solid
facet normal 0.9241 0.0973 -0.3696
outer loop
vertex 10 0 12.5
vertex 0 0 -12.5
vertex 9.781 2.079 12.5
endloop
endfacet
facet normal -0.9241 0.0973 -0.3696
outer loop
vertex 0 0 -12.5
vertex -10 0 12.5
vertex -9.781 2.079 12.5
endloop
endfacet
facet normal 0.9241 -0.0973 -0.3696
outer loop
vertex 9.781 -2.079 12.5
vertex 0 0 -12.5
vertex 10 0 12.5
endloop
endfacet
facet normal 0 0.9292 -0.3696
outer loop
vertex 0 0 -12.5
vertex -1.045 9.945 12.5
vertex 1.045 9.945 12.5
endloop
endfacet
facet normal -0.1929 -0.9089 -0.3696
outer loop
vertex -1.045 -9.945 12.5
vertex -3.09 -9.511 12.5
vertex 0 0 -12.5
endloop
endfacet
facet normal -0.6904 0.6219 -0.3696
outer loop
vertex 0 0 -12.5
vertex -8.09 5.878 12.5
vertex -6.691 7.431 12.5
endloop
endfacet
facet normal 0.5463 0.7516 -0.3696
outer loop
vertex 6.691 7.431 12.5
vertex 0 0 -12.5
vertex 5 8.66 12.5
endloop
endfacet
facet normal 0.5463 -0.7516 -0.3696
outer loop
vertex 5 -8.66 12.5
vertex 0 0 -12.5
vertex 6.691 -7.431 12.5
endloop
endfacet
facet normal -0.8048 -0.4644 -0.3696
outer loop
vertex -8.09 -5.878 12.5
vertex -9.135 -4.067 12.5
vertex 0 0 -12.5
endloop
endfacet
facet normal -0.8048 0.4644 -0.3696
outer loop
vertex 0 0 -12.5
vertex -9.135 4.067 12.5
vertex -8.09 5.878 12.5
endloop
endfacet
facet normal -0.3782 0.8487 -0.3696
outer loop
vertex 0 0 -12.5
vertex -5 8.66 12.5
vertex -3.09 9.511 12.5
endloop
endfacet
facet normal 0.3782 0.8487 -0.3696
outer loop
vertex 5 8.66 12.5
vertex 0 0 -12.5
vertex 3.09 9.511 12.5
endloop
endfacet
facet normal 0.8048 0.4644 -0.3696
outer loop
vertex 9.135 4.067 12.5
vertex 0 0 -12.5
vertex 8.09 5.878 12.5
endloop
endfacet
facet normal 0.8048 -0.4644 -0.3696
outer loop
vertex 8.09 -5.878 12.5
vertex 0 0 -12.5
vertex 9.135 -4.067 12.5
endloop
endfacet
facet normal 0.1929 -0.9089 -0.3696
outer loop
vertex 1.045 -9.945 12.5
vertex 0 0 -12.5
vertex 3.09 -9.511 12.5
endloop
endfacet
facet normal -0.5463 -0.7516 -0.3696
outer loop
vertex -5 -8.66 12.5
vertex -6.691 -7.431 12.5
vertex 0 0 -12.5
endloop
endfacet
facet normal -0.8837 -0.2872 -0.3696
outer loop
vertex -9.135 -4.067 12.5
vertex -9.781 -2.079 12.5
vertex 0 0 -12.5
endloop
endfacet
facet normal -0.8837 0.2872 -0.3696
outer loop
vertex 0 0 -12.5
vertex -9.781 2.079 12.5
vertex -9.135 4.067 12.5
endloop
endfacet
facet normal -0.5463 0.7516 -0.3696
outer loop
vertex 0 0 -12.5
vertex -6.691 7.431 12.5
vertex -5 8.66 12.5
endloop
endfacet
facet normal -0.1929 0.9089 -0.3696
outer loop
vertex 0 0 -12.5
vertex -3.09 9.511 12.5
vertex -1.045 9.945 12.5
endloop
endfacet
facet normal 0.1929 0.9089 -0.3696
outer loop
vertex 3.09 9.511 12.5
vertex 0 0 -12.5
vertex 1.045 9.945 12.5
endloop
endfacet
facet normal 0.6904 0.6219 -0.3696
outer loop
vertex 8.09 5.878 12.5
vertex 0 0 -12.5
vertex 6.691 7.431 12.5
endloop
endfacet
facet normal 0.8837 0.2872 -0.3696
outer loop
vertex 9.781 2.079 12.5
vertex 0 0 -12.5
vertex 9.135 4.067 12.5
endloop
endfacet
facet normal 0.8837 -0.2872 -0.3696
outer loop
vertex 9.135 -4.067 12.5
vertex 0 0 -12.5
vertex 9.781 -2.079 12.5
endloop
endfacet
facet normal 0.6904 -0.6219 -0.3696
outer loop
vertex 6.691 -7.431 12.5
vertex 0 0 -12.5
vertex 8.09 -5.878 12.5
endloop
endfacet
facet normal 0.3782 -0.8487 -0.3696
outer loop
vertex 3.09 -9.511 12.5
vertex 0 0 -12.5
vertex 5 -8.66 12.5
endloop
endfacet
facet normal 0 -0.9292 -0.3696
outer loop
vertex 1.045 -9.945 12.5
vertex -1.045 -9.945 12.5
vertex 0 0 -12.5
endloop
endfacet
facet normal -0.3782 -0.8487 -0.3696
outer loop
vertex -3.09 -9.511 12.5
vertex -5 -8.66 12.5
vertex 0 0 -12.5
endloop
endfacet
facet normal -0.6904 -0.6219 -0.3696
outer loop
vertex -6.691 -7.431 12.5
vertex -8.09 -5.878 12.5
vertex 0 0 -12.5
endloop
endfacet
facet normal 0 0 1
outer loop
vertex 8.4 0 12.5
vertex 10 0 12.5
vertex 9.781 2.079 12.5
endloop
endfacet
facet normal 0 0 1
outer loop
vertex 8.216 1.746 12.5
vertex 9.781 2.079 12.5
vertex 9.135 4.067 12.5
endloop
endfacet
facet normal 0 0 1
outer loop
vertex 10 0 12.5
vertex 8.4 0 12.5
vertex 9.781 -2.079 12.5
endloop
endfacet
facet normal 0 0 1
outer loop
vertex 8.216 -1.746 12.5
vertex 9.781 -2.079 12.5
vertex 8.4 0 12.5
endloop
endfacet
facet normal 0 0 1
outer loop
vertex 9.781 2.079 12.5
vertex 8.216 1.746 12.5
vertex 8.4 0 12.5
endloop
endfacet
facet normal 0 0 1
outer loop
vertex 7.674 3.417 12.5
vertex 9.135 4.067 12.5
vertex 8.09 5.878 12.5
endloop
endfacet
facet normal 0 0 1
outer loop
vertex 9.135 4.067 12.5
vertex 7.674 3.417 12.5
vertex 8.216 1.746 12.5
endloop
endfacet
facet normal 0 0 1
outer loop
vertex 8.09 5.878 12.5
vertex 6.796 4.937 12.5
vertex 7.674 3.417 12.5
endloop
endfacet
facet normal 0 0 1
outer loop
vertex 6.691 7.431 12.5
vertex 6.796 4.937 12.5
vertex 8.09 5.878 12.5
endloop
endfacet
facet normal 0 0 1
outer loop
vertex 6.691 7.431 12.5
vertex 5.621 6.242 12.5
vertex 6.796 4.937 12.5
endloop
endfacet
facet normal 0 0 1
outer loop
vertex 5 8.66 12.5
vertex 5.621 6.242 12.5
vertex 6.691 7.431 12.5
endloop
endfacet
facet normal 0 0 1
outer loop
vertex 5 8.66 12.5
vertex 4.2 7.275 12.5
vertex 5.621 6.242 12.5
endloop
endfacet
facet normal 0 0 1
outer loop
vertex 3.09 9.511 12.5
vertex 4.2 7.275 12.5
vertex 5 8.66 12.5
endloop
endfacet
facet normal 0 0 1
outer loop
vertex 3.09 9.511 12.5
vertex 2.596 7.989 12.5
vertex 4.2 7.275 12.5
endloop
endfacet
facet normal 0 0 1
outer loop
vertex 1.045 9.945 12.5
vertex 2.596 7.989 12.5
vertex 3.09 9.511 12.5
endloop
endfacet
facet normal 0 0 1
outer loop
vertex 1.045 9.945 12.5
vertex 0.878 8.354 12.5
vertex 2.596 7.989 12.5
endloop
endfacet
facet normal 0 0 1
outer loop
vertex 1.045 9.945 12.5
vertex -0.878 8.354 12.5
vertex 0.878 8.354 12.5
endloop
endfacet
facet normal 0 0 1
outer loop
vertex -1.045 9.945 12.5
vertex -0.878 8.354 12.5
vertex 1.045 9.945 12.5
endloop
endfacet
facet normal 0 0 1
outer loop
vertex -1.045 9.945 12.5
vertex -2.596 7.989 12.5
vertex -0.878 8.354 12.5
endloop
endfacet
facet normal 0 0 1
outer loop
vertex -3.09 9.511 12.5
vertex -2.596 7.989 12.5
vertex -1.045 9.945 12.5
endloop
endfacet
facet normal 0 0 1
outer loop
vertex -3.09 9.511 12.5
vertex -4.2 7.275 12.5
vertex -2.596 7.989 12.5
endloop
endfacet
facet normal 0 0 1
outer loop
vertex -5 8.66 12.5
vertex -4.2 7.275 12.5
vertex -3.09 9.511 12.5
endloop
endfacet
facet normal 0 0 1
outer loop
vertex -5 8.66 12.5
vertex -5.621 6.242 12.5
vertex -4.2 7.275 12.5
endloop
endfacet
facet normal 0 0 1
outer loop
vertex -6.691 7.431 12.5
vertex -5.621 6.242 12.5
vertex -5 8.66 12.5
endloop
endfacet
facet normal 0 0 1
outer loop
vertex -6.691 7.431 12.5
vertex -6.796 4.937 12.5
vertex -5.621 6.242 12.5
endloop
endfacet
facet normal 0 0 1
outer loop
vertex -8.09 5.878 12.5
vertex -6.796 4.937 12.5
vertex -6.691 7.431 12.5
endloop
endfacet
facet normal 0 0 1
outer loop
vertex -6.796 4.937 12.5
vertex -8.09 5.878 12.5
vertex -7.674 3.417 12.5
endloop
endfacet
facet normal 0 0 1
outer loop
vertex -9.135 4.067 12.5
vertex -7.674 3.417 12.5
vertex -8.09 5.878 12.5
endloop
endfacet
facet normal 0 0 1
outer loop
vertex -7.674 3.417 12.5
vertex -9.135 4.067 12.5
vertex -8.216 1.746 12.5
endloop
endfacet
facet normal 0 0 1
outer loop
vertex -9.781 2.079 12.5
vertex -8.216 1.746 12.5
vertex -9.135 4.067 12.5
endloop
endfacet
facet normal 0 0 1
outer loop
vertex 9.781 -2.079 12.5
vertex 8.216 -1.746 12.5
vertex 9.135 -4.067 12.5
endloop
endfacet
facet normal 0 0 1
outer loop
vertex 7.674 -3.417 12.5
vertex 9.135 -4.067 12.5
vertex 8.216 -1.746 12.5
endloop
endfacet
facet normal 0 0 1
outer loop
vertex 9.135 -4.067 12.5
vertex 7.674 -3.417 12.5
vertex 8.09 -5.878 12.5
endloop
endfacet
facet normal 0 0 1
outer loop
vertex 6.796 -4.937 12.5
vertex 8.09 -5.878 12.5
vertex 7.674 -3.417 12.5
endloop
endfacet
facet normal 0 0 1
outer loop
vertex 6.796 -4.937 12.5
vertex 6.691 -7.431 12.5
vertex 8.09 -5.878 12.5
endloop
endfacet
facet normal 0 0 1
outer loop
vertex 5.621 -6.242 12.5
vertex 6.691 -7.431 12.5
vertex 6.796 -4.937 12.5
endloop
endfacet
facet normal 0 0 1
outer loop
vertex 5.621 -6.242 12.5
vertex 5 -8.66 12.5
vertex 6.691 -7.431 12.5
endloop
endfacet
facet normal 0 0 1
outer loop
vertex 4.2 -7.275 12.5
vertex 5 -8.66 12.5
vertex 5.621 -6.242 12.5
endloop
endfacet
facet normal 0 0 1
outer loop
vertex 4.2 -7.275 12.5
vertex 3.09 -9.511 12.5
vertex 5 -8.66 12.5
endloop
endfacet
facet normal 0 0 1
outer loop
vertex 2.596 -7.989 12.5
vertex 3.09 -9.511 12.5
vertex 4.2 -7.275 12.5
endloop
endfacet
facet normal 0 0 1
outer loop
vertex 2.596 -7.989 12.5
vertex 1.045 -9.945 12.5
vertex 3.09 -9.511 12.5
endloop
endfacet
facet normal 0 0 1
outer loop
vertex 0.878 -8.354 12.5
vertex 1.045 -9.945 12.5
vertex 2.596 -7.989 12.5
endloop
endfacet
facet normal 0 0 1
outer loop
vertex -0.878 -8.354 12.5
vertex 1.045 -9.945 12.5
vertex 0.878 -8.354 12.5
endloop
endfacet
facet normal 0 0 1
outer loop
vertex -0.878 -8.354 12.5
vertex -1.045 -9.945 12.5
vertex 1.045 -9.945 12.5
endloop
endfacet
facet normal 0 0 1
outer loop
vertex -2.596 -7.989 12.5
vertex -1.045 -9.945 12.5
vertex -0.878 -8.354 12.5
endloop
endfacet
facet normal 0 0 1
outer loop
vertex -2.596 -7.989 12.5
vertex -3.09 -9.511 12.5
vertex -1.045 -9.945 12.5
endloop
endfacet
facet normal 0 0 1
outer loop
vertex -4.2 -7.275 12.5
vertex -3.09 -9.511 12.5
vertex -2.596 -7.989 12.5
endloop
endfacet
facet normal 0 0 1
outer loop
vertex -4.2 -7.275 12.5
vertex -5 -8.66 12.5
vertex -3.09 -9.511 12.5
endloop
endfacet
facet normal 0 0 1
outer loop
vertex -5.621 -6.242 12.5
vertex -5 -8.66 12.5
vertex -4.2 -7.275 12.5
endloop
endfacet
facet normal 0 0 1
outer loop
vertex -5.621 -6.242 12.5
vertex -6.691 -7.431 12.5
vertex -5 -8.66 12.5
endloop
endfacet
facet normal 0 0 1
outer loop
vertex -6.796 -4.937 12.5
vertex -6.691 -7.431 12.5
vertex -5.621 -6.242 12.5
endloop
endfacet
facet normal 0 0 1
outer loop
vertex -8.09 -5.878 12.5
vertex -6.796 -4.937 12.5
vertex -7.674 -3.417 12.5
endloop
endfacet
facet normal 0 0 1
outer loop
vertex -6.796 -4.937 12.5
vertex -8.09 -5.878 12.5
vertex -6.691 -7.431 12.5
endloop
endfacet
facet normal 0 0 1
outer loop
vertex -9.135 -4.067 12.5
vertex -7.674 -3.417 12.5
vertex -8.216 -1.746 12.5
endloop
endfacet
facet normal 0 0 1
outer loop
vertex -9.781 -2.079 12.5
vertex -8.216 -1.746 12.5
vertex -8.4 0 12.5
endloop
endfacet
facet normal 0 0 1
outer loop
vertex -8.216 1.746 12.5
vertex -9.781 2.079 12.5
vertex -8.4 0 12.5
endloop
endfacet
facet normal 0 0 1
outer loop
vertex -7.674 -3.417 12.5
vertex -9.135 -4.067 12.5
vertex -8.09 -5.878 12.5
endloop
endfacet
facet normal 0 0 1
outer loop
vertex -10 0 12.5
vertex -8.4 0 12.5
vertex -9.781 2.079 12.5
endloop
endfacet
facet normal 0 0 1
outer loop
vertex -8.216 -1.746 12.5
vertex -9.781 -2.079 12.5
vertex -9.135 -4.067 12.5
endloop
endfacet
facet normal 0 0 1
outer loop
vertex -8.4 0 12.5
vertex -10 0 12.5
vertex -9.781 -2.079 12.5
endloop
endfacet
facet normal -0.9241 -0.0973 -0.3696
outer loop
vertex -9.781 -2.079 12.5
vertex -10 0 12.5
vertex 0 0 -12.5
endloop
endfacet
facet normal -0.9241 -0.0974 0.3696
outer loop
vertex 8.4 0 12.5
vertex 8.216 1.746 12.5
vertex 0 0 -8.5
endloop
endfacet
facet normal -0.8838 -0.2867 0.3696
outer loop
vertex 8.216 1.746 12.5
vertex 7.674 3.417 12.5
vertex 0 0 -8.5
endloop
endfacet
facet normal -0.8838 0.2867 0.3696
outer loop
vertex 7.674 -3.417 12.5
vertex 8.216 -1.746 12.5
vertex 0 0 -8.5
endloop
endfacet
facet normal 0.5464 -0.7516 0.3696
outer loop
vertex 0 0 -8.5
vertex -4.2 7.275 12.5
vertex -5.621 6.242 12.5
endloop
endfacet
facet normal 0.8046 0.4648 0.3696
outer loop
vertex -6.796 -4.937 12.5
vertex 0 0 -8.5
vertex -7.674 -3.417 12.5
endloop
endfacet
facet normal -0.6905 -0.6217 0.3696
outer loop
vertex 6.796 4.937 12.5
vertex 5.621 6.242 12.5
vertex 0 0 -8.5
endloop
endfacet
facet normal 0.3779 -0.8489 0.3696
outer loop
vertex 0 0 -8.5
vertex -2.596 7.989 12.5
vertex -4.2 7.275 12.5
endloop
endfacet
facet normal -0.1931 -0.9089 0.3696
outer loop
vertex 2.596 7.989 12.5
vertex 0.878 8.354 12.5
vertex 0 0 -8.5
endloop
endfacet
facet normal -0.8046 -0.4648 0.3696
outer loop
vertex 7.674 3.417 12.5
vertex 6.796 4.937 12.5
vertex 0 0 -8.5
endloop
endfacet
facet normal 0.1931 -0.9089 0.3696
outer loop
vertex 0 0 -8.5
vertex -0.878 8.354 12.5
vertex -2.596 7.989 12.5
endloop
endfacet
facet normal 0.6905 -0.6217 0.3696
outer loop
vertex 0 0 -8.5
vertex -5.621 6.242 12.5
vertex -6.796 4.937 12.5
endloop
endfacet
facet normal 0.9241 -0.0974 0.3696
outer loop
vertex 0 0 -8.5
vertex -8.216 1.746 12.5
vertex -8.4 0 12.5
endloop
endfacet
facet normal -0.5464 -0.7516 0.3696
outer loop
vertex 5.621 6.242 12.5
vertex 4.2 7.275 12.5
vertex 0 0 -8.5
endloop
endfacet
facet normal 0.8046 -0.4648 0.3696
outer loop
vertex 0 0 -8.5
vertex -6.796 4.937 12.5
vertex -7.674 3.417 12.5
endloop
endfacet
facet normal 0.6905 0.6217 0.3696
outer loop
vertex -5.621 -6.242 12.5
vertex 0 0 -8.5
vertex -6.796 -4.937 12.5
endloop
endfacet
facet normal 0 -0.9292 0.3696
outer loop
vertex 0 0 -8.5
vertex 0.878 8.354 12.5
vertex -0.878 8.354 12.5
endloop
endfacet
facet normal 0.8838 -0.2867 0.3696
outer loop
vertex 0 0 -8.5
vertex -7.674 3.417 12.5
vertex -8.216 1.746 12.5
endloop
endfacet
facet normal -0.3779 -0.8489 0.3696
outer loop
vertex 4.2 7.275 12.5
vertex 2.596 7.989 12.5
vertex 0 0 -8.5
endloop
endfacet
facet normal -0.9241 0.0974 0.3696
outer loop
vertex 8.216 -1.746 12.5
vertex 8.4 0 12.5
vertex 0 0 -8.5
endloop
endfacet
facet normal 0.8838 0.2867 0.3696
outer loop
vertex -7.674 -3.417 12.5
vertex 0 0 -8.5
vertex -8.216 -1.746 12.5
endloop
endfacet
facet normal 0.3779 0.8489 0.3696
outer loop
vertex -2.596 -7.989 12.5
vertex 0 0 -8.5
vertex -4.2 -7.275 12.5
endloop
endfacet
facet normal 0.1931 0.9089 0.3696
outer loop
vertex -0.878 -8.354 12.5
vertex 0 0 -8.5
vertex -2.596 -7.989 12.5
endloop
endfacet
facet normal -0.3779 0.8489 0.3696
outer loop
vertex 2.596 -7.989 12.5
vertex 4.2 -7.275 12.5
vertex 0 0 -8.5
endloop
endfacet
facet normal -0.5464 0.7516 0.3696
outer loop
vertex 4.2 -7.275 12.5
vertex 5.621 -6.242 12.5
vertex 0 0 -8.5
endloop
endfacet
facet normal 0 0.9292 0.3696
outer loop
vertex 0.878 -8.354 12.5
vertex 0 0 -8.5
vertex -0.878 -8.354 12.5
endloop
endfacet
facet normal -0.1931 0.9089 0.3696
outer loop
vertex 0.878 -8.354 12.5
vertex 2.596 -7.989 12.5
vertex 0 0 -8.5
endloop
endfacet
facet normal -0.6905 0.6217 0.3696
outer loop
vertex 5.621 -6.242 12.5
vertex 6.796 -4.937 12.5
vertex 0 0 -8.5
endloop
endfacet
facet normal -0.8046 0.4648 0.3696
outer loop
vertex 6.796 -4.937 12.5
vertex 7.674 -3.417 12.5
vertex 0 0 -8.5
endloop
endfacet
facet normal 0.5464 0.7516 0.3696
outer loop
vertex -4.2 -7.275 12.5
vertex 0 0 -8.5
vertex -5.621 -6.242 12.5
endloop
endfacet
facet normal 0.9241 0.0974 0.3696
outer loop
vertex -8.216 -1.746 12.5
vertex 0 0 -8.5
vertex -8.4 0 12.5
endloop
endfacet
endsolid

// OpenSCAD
difference() {
  cylinder(r1=0, r2=10, h=25, center=true);
  translate([0, 0, 4]) {
    cylinder(r1=0, r2=10, h=25, center=true);
  }
}
